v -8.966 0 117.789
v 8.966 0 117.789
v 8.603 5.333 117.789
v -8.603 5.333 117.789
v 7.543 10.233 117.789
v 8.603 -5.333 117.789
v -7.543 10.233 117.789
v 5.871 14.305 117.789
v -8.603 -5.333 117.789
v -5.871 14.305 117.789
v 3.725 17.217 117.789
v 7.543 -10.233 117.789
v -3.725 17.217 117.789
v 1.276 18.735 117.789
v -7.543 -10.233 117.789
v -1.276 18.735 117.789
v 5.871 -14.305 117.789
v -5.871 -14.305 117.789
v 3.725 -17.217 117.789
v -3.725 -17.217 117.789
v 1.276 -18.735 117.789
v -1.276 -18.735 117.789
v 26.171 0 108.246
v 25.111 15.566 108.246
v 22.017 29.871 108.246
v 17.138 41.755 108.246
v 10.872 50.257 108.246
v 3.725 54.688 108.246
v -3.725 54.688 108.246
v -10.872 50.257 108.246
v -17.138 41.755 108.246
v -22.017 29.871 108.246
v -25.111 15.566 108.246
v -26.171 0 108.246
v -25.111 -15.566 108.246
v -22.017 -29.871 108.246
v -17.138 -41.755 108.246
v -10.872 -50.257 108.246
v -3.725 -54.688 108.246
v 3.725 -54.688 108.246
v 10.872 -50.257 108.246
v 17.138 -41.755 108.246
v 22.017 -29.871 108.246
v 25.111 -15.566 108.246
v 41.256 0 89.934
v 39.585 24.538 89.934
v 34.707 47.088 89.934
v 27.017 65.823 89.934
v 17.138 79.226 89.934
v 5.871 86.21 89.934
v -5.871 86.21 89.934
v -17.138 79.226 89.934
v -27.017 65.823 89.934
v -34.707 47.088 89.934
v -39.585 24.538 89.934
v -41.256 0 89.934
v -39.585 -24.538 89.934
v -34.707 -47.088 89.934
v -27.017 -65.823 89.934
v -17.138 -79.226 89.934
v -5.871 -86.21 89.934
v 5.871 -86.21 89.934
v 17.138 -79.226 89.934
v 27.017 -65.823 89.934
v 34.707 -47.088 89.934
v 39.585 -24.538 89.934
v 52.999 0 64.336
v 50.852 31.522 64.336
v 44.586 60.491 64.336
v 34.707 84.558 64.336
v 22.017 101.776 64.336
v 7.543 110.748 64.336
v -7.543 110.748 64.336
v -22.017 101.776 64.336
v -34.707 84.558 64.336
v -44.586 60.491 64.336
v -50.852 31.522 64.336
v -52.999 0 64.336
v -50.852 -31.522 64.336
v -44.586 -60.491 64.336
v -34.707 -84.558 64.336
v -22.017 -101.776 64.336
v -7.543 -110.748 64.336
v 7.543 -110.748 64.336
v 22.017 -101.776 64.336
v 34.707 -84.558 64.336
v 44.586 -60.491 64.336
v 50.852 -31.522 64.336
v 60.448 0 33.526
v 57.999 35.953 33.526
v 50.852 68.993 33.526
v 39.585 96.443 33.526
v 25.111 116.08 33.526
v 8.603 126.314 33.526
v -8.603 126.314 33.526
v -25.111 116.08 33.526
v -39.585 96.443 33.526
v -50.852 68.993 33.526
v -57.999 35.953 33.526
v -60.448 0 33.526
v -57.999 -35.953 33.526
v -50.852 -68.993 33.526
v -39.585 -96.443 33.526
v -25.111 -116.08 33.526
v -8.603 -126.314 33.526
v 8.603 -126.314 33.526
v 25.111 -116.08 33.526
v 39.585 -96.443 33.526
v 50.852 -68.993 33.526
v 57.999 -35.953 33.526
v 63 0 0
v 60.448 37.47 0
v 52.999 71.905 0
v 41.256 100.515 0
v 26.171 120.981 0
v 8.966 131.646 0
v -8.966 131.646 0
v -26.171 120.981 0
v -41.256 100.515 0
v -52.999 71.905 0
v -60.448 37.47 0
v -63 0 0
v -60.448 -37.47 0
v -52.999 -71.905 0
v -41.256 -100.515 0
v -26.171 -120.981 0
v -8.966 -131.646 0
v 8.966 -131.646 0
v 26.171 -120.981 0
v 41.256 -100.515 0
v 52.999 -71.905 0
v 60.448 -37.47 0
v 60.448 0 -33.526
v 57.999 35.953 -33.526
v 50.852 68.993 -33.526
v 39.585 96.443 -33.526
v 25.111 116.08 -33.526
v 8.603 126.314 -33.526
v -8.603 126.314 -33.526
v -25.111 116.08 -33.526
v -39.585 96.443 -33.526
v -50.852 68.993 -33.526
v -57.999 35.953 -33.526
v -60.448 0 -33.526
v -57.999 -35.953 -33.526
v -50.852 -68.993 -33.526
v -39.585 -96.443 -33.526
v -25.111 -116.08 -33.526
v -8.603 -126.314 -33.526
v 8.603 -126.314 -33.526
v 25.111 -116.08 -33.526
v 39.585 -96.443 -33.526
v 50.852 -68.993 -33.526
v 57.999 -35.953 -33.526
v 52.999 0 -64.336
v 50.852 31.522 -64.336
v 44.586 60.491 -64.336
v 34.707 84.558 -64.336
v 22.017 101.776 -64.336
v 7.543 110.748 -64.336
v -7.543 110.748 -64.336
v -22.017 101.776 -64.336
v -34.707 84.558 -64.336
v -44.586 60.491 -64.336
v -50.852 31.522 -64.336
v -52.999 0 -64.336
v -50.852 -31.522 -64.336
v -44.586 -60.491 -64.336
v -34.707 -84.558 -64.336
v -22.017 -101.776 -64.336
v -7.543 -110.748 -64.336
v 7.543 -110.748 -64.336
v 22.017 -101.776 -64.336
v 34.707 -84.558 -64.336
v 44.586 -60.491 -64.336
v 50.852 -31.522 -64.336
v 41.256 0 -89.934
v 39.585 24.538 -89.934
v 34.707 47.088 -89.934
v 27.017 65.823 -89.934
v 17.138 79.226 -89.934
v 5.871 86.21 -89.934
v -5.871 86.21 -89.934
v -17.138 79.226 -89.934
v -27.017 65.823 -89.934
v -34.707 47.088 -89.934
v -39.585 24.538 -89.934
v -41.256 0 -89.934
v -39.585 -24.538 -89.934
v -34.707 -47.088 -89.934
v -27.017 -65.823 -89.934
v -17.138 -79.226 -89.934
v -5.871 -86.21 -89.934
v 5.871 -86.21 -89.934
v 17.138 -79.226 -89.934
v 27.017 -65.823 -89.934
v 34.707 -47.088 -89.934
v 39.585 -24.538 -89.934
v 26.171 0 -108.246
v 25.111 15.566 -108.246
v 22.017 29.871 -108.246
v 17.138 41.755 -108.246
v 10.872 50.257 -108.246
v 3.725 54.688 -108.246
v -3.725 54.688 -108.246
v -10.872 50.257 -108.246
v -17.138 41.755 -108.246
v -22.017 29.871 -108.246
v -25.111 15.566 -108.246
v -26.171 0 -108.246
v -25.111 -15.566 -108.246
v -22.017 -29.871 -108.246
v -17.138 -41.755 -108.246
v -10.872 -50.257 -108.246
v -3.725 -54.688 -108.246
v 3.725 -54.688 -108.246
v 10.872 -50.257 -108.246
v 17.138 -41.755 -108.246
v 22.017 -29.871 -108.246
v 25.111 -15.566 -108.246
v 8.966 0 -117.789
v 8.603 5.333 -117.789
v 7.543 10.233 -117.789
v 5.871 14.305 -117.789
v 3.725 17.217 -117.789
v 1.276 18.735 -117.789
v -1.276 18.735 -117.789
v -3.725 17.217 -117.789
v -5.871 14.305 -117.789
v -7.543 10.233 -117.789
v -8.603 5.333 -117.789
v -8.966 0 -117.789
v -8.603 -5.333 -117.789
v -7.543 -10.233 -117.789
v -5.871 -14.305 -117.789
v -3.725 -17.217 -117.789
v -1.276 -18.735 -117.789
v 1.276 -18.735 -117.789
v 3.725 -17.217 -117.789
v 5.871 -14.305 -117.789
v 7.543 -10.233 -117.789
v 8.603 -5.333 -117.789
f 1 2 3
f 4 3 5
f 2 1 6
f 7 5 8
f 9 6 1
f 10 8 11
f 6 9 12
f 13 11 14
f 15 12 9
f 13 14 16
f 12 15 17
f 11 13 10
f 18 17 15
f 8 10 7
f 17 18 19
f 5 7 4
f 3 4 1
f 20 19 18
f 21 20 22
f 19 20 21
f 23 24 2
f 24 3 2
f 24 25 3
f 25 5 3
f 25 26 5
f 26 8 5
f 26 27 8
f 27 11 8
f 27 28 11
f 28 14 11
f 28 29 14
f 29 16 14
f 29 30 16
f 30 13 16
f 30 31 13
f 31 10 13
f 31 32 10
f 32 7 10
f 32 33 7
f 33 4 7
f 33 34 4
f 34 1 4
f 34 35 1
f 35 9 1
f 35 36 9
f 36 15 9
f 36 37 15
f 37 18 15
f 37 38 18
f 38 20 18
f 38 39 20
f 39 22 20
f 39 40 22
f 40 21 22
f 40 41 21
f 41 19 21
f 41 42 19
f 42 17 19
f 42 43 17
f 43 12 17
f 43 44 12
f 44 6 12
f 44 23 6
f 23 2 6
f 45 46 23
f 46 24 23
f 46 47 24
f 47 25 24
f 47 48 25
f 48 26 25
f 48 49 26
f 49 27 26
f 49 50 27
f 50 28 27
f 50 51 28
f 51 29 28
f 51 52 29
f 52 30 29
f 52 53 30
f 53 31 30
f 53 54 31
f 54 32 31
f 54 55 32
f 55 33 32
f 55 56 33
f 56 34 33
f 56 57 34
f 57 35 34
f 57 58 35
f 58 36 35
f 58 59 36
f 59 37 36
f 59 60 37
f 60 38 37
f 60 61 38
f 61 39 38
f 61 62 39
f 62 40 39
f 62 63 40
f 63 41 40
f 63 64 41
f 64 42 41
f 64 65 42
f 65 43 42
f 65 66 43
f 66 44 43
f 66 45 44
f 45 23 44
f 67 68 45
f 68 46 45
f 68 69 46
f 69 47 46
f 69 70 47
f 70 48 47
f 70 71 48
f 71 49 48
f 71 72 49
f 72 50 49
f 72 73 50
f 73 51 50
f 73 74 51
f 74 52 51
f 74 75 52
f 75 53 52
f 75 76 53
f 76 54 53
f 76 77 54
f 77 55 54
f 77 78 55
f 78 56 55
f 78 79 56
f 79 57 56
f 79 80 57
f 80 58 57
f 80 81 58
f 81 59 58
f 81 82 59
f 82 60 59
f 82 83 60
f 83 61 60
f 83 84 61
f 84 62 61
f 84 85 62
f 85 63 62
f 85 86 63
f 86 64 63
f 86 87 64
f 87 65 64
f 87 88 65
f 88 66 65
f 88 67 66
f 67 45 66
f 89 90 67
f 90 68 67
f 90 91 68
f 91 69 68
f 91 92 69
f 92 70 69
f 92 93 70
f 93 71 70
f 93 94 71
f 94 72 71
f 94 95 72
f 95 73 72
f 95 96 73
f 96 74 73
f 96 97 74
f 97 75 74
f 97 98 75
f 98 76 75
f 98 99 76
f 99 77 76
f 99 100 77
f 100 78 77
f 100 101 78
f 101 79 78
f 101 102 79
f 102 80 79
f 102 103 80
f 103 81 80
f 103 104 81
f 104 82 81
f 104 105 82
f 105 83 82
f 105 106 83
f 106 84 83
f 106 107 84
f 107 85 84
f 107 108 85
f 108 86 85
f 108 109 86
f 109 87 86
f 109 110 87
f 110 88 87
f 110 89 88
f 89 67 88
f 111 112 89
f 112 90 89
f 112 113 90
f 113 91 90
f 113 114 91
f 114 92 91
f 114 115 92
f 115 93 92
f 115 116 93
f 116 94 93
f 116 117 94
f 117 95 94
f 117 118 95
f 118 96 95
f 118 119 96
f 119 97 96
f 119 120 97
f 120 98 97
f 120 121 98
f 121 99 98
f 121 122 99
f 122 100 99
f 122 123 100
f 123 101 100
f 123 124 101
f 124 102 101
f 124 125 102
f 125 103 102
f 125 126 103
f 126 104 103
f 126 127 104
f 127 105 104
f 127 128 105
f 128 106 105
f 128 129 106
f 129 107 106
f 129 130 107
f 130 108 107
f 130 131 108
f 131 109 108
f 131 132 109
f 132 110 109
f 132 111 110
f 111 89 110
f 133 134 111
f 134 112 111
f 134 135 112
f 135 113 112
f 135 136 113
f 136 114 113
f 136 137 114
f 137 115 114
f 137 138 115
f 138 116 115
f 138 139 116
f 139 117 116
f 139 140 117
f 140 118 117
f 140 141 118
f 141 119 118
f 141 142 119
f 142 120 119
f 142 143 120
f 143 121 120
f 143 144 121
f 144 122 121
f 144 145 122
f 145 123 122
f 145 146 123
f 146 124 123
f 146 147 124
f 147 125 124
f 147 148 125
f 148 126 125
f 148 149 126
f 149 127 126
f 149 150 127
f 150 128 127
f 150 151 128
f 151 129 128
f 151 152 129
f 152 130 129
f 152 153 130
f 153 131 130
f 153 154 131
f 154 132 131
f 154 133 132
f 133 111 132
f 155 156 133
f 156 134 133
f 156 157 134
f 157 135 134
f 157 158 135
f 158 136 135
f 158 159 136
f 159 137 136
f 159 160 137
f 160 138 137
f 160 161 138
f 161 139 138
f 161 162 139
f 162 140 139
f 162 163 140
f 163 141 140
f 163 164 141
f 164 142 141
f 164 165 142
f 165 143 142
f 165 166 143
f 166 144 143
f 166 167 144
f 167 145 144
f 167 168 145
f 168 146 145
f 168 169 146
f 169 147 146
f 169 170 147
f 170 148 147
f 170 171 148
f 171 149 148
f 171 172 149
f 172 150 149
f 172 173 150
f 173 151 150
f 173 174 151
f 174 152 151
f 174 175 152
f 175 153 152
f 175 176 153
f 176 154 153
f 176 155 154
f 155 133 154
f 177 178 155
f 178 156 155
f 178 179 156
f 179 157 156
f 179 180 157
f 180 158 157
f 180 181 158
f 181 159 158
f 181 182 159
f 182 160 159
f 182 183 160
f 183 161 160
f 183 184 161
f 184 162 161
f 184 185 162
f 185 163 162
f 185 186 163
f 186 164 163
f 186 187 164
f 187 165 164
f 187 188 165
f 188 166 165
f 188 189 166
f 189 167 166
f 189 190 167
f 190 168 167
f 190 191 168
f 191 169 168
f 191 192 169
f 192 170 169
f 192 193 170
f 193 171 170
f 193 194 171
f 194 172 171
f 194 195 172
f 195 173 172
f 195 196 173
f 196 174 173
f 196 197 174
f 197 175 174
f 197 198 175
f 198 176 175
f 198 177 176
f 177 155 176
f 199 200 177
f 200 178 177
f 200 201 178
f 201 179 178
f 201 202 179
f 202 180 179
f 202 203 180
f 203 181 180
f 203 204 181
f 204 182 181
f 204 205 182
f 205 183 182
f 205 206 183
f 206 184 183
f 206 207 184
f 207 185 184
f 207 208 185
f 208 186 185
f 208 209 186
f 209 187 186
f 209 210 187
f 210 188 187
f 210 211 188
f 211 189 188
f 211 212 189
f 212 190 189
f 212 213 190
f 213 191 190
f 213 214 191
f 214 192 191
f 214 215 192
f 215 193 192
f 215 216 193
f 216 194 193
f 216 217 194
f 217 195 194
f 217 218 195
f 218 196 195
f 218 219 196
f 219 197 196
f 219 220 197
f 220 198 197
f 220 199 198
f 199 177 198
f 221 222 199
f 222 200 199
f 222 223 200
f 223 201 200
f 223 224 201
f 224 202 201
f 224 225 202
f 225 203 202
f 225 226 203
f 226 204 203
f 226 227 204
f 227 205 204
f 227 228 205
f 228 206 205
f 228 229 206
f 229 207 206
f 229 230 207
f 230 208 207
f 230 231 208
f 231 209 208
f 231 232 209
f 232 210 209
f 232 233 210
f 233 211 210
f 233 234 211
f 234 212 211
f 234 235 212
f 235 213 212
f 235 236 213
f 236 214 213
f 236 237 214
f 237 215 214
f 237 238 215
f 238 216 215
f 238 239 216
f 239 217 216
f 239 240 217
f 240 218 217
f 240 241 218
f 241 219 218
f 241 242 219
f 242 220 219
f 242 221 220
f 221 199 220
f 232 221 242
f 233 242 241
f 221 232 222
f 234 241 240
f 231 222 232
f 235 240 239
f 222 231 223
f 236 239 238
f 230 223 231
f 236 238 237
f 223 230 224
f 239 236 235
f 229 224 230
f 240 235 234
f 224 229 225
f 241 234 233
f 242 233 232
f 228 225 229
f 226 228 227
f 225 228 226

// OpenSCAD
// Generated by SolidPython 1.0.1 on 2020-07-29 00:46:49


scale(v = [9, 19, 17]) {
	sphere(r = 7);
}
/***********************************************
*********      SolidPython code:      **********
************************************************
 
# import packages: SolidPython
from solid import *
from solid.utils import *
from itertools import chain, combinations, permutations


class Resize:

    def __init__(self, scad_file):
        self.scad_file = scad_file
        #self.scad_file = import_scad(scad_file)
        # cone/cylinder param:
        self.r1 = 0
        self.r2 = 0
        self.h = 0
        # rectangular prism param:
        self.w = 0
        self.l = 0
        # ellipse param:
        self.r = 0

    # import OpenScad code (file name corresponds to shape)


    # classify shape + parameters
    def assign(self, param1, param2, param3):
        if self.scad_file == 'cone.scad':
            self.r1 = param1
            self.r2 = param2
            self.h = param3
        elif self.scad_file == 'cylinder.scad':
            self.r1 = param1
            self.r2 = param2
            self.h = param3
        elif self.scad_file == 'rectangularPrism.scad':
            self.h = param1
            self.l = param2
            self.w = param3
        else:
            self.r = param1
            self.h = param2

    # resize parameters
    def iterate(self):
        x = range(3, 20, 2)
        i = 1
        if self.scad_file == 'cone.scad':
            tempList = list(permutations(x, 2))
            for temp in tempList:
                param1 = temp[0]
                param2 = temp[1]
                filepath = 'produced_scad_files/' + 'cone' + str(param1) + '_' + str(param2) + '_' + '.scad'
                scad_render_to_file(cylinder(h=param1, r1=param2, r2=0), filepath)

        elif self.scad_file == 'cylinder.scad':
            tempList = list(permutations(x, 3))
            for temp in tempList:
                param1 = temp[0]
                param2 = temp[1]
                filepath = 'produced_scad_files/' + 'cylinder' + str(param1) + '_' + str(param2) + '_' + '.scad'
                scad_render_to_file(cylinder(h=param1, r1=param2, r2=param2), filepath)

        elif self.scad_file == 'rectangularPrism.scad':
            tempList = list(permutations(x, 3))
            for temp in tempList:
                param1 = temp[0]
                param2 = temp[1]
                param3 = temp[2]
                filepath = 'produced_scad_files/' + 'rectangularPrism' + str(param1) + '_' + str(param2) + '_' + str(
                    param3) + '.scad'
                scad_render_to_file(cube(size=(param1, param2, param3)), filepath)

        elif self.scad_file == 'ellipse.scad':
            tempList = list(permutations(x, 4))
            for temp in tempList:
                param1 = temp[0]
                param2 = temp[1]
                param3 = temp[2]
                param4 = temp[3]
                filepath = 'produced_scad_files/' + 'ellipse' + str(param1) + '_' + str(param2) + '_' + str(param3) + '_' + str(param4) + '.scad'
                scad_render_to_file(scale([param1, param2, param3])(sphere(r=param4)), filepath)

    def render_to_scadfile(self):
        scad_render_to_file(scad, 'example.scad') 
 
************************************************/
